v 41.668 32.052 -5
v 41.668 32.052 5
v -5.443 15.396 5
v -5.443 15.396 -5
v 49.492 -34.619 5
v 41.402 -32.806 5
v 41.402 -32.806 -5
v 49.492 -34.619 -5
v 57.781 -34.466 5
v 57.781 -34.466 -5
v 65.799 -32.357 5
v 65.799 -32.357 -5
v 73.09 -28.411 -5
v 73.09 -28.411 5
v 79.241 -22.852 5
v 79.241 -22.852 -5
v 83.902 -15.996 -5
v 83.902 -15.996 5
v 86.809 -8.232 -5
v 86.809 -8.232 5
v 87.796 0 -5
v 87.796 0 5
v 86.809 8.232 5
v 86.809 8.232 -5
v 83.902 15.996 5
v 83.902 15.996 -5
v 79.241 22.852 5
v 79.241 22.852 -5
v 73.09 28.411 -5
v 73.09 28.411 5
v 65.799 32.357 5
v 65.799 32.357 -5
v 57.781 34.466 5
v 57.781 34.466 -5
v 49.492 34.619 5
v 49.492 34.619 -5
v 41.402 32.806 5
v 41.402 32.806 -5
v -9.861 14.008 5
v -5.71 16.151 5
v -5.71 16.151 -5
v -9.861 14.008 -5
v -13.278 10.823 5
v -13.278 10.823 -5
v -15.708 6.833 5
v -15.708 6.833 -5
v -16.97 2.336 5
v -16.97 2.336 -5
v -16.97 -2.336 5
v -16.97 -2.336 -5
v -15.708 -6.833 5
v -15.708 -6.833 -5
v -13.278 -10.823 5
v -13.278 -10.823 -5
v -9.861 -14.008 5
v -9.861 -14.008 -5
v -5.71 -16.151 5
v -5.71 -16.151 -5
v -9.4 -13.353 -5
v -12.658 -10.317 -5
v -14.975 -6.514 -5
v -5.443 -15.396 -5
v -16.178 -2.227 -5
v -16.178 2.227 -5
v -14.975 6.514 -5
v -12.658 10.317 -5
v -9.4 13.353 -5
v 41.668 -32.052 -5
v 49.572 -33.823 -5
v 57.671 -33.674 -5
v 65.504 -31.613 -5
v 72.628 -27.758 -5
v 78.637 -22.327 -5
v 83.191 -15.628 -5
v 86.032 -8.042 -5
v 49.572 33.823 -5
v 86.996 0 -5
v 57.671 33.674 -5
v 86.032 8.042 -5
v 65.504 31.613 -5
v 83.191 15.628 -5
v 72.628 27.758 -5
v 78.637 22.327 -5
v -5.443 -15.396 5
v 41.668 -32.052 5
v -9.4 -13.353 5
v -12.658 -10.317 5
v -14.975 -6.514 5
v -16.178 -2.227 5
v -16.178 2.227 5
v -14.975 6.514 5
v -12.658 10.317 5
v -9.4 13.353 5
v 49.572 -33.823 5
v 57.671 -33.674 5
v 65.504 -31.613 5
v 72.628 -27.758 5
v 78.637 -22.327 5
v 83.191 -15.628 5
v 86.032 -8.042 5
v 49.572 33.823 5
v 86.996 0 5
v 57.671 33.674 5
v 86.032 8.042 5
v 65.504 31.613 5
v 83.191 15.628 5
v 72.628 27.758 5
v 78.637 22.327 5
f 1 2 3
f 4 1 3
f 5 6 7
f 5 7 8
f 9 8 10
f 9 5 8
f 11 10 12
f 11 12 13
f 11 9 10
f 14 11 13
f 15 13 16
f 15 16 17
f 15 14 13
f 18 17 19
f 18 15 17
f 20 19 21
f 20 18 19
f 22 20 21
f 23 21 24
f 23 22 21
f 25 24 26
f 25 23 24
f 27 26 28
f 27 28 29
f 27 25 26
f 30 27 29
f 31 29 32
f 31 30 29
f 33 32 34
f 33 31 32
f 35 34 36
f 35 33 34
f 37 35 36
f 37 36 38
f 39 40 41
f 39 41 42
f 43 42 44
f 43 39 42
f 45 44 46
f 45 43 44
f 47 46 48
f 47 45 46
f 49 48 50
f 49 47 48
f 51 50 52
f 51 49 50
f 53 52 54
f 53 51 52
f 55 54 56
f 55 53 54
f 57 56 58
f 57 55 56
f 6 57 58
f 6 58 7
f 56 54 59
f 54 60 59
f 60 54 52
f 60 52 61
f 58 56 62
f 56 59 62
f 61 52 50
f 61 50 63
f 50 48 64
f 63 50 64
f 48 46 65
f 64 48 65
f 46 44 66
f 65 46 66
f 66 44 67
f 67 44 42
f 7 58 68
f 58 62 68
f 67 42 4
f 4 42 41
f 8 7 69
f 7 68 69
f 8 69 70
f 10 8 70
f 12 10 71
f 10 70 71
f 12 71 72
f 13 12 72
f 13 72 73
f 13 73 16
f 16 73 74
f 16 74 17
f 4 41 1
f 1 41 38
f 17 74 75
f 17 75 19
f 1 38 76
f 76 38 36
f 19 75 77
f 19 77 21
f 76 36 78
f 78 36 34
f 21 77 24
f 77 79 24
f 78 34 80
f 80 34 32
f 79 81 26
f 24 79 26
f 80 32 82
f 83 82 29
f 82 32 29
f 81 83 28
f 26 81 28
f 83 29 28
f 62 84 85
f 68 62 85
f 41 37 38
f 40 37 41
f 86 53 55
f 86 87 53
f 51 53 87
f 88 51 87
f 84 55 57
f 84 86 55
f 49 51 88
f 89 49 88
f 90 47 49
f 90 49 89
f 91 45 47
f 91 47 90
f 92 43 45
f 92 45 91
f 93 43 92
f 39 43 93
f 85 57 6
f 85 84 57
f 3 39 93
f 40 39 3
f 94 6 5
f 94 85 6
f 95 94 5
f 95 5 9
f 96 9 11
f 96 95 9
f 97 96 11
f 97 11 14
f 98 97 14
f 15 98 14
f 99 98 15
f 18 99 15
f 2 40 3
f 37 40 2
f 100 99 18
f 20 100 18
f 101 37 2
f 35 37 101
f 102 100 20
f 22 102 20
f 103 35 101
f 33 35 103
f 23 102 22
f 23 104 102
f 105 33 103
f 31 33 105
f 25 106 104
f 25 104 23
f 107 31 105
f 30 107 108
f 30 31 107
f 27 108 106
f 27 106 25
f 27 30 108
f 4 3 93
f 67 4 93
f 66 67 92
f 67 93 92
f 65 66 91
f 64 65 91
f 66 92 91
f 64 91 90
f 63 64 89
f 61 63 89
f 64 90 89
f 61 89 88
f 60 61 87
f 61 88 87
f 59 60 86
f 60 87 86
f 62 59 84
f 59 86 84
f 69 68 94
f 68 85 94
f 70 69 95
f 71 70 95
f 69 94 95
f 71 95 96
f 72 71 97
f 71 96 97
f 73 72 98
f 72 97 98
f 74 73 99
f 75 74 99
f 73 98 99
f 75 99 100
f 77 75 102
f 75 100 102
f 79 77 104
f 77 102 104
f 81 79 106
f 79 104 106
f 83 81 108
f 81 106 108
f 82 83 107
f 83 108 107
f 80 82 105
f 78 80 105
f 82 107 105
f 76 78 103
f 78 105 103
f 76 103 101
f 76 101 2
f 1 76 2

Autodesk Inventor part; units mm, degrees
ref_plane "YZ Plane" through (0, 0, 0) normal (1, 0, 0) x (0, 1, 0)
ref_plane "XZ Plane" through (0, 0, 0) normal (0, 1, 0) x (-1, 0, 0)
ref_plane "XY Plane" through (0, 0, 0) normal (0, 0, 1) x (1, 0, 0)
sketch "スケッチ1" plane through (0, 0, 0) normal (0, 0, 1) x (1, 0, 0)
  arc A0 (-5.5703, 15.7556) -> (-5.5703, -15.7556) centre (0, 0) ccw
  arc A1 (41.5411, -32.4115) -> (41.5411, 32.4115) centre (53, 0) ccw
  line L0 (-5.5703, 15.7556) -> (41.5411, 32.4115)
  line L1 (-5.5703, -15.7556) -> (41.5411, -32.4115)
  line L2 (41.4015, 32.8065) -> (-5.7099, 16.1506)
  arc A2 (-5.7099, 16.1506) -> (-5.7099, -16.1506) centre (0, 0) ccw
  line L3 (-5.7099, -16.1506) -> (41.4015, -32.8065)
  arc A3 (41.4015, -32.8065) -> (41.4015, 32.8065) centre (53, 0) ccw
  line L4 (41.6681, 32.0523) -> (-5.4433, 15.3964)
  arc A4 (-5.4433, 15.3964) -> (-5.4433, -15.3964) centre (0, 0) ccw
  line L5 (-5.4433, -15.3964) -> (41.6681, -32.0523)
  arc A5 (41.6681, -32.0523) -> (41.6681, 32.0523) centre (53, 0) ccw
  dimension "d6" = 33.4225
  dimension "d7" = 68.7549
  dimension "d8" = 53
  dimension "d11" = 0.419
  dimension "d12" = 0.8
extrude "押し出し1" add sketch "スケッチ1" along normal mid plane 10 contours L0 A1 L1 A0 | A3 L3 A2 L2
properties part number "belt5" material "ゴム"
